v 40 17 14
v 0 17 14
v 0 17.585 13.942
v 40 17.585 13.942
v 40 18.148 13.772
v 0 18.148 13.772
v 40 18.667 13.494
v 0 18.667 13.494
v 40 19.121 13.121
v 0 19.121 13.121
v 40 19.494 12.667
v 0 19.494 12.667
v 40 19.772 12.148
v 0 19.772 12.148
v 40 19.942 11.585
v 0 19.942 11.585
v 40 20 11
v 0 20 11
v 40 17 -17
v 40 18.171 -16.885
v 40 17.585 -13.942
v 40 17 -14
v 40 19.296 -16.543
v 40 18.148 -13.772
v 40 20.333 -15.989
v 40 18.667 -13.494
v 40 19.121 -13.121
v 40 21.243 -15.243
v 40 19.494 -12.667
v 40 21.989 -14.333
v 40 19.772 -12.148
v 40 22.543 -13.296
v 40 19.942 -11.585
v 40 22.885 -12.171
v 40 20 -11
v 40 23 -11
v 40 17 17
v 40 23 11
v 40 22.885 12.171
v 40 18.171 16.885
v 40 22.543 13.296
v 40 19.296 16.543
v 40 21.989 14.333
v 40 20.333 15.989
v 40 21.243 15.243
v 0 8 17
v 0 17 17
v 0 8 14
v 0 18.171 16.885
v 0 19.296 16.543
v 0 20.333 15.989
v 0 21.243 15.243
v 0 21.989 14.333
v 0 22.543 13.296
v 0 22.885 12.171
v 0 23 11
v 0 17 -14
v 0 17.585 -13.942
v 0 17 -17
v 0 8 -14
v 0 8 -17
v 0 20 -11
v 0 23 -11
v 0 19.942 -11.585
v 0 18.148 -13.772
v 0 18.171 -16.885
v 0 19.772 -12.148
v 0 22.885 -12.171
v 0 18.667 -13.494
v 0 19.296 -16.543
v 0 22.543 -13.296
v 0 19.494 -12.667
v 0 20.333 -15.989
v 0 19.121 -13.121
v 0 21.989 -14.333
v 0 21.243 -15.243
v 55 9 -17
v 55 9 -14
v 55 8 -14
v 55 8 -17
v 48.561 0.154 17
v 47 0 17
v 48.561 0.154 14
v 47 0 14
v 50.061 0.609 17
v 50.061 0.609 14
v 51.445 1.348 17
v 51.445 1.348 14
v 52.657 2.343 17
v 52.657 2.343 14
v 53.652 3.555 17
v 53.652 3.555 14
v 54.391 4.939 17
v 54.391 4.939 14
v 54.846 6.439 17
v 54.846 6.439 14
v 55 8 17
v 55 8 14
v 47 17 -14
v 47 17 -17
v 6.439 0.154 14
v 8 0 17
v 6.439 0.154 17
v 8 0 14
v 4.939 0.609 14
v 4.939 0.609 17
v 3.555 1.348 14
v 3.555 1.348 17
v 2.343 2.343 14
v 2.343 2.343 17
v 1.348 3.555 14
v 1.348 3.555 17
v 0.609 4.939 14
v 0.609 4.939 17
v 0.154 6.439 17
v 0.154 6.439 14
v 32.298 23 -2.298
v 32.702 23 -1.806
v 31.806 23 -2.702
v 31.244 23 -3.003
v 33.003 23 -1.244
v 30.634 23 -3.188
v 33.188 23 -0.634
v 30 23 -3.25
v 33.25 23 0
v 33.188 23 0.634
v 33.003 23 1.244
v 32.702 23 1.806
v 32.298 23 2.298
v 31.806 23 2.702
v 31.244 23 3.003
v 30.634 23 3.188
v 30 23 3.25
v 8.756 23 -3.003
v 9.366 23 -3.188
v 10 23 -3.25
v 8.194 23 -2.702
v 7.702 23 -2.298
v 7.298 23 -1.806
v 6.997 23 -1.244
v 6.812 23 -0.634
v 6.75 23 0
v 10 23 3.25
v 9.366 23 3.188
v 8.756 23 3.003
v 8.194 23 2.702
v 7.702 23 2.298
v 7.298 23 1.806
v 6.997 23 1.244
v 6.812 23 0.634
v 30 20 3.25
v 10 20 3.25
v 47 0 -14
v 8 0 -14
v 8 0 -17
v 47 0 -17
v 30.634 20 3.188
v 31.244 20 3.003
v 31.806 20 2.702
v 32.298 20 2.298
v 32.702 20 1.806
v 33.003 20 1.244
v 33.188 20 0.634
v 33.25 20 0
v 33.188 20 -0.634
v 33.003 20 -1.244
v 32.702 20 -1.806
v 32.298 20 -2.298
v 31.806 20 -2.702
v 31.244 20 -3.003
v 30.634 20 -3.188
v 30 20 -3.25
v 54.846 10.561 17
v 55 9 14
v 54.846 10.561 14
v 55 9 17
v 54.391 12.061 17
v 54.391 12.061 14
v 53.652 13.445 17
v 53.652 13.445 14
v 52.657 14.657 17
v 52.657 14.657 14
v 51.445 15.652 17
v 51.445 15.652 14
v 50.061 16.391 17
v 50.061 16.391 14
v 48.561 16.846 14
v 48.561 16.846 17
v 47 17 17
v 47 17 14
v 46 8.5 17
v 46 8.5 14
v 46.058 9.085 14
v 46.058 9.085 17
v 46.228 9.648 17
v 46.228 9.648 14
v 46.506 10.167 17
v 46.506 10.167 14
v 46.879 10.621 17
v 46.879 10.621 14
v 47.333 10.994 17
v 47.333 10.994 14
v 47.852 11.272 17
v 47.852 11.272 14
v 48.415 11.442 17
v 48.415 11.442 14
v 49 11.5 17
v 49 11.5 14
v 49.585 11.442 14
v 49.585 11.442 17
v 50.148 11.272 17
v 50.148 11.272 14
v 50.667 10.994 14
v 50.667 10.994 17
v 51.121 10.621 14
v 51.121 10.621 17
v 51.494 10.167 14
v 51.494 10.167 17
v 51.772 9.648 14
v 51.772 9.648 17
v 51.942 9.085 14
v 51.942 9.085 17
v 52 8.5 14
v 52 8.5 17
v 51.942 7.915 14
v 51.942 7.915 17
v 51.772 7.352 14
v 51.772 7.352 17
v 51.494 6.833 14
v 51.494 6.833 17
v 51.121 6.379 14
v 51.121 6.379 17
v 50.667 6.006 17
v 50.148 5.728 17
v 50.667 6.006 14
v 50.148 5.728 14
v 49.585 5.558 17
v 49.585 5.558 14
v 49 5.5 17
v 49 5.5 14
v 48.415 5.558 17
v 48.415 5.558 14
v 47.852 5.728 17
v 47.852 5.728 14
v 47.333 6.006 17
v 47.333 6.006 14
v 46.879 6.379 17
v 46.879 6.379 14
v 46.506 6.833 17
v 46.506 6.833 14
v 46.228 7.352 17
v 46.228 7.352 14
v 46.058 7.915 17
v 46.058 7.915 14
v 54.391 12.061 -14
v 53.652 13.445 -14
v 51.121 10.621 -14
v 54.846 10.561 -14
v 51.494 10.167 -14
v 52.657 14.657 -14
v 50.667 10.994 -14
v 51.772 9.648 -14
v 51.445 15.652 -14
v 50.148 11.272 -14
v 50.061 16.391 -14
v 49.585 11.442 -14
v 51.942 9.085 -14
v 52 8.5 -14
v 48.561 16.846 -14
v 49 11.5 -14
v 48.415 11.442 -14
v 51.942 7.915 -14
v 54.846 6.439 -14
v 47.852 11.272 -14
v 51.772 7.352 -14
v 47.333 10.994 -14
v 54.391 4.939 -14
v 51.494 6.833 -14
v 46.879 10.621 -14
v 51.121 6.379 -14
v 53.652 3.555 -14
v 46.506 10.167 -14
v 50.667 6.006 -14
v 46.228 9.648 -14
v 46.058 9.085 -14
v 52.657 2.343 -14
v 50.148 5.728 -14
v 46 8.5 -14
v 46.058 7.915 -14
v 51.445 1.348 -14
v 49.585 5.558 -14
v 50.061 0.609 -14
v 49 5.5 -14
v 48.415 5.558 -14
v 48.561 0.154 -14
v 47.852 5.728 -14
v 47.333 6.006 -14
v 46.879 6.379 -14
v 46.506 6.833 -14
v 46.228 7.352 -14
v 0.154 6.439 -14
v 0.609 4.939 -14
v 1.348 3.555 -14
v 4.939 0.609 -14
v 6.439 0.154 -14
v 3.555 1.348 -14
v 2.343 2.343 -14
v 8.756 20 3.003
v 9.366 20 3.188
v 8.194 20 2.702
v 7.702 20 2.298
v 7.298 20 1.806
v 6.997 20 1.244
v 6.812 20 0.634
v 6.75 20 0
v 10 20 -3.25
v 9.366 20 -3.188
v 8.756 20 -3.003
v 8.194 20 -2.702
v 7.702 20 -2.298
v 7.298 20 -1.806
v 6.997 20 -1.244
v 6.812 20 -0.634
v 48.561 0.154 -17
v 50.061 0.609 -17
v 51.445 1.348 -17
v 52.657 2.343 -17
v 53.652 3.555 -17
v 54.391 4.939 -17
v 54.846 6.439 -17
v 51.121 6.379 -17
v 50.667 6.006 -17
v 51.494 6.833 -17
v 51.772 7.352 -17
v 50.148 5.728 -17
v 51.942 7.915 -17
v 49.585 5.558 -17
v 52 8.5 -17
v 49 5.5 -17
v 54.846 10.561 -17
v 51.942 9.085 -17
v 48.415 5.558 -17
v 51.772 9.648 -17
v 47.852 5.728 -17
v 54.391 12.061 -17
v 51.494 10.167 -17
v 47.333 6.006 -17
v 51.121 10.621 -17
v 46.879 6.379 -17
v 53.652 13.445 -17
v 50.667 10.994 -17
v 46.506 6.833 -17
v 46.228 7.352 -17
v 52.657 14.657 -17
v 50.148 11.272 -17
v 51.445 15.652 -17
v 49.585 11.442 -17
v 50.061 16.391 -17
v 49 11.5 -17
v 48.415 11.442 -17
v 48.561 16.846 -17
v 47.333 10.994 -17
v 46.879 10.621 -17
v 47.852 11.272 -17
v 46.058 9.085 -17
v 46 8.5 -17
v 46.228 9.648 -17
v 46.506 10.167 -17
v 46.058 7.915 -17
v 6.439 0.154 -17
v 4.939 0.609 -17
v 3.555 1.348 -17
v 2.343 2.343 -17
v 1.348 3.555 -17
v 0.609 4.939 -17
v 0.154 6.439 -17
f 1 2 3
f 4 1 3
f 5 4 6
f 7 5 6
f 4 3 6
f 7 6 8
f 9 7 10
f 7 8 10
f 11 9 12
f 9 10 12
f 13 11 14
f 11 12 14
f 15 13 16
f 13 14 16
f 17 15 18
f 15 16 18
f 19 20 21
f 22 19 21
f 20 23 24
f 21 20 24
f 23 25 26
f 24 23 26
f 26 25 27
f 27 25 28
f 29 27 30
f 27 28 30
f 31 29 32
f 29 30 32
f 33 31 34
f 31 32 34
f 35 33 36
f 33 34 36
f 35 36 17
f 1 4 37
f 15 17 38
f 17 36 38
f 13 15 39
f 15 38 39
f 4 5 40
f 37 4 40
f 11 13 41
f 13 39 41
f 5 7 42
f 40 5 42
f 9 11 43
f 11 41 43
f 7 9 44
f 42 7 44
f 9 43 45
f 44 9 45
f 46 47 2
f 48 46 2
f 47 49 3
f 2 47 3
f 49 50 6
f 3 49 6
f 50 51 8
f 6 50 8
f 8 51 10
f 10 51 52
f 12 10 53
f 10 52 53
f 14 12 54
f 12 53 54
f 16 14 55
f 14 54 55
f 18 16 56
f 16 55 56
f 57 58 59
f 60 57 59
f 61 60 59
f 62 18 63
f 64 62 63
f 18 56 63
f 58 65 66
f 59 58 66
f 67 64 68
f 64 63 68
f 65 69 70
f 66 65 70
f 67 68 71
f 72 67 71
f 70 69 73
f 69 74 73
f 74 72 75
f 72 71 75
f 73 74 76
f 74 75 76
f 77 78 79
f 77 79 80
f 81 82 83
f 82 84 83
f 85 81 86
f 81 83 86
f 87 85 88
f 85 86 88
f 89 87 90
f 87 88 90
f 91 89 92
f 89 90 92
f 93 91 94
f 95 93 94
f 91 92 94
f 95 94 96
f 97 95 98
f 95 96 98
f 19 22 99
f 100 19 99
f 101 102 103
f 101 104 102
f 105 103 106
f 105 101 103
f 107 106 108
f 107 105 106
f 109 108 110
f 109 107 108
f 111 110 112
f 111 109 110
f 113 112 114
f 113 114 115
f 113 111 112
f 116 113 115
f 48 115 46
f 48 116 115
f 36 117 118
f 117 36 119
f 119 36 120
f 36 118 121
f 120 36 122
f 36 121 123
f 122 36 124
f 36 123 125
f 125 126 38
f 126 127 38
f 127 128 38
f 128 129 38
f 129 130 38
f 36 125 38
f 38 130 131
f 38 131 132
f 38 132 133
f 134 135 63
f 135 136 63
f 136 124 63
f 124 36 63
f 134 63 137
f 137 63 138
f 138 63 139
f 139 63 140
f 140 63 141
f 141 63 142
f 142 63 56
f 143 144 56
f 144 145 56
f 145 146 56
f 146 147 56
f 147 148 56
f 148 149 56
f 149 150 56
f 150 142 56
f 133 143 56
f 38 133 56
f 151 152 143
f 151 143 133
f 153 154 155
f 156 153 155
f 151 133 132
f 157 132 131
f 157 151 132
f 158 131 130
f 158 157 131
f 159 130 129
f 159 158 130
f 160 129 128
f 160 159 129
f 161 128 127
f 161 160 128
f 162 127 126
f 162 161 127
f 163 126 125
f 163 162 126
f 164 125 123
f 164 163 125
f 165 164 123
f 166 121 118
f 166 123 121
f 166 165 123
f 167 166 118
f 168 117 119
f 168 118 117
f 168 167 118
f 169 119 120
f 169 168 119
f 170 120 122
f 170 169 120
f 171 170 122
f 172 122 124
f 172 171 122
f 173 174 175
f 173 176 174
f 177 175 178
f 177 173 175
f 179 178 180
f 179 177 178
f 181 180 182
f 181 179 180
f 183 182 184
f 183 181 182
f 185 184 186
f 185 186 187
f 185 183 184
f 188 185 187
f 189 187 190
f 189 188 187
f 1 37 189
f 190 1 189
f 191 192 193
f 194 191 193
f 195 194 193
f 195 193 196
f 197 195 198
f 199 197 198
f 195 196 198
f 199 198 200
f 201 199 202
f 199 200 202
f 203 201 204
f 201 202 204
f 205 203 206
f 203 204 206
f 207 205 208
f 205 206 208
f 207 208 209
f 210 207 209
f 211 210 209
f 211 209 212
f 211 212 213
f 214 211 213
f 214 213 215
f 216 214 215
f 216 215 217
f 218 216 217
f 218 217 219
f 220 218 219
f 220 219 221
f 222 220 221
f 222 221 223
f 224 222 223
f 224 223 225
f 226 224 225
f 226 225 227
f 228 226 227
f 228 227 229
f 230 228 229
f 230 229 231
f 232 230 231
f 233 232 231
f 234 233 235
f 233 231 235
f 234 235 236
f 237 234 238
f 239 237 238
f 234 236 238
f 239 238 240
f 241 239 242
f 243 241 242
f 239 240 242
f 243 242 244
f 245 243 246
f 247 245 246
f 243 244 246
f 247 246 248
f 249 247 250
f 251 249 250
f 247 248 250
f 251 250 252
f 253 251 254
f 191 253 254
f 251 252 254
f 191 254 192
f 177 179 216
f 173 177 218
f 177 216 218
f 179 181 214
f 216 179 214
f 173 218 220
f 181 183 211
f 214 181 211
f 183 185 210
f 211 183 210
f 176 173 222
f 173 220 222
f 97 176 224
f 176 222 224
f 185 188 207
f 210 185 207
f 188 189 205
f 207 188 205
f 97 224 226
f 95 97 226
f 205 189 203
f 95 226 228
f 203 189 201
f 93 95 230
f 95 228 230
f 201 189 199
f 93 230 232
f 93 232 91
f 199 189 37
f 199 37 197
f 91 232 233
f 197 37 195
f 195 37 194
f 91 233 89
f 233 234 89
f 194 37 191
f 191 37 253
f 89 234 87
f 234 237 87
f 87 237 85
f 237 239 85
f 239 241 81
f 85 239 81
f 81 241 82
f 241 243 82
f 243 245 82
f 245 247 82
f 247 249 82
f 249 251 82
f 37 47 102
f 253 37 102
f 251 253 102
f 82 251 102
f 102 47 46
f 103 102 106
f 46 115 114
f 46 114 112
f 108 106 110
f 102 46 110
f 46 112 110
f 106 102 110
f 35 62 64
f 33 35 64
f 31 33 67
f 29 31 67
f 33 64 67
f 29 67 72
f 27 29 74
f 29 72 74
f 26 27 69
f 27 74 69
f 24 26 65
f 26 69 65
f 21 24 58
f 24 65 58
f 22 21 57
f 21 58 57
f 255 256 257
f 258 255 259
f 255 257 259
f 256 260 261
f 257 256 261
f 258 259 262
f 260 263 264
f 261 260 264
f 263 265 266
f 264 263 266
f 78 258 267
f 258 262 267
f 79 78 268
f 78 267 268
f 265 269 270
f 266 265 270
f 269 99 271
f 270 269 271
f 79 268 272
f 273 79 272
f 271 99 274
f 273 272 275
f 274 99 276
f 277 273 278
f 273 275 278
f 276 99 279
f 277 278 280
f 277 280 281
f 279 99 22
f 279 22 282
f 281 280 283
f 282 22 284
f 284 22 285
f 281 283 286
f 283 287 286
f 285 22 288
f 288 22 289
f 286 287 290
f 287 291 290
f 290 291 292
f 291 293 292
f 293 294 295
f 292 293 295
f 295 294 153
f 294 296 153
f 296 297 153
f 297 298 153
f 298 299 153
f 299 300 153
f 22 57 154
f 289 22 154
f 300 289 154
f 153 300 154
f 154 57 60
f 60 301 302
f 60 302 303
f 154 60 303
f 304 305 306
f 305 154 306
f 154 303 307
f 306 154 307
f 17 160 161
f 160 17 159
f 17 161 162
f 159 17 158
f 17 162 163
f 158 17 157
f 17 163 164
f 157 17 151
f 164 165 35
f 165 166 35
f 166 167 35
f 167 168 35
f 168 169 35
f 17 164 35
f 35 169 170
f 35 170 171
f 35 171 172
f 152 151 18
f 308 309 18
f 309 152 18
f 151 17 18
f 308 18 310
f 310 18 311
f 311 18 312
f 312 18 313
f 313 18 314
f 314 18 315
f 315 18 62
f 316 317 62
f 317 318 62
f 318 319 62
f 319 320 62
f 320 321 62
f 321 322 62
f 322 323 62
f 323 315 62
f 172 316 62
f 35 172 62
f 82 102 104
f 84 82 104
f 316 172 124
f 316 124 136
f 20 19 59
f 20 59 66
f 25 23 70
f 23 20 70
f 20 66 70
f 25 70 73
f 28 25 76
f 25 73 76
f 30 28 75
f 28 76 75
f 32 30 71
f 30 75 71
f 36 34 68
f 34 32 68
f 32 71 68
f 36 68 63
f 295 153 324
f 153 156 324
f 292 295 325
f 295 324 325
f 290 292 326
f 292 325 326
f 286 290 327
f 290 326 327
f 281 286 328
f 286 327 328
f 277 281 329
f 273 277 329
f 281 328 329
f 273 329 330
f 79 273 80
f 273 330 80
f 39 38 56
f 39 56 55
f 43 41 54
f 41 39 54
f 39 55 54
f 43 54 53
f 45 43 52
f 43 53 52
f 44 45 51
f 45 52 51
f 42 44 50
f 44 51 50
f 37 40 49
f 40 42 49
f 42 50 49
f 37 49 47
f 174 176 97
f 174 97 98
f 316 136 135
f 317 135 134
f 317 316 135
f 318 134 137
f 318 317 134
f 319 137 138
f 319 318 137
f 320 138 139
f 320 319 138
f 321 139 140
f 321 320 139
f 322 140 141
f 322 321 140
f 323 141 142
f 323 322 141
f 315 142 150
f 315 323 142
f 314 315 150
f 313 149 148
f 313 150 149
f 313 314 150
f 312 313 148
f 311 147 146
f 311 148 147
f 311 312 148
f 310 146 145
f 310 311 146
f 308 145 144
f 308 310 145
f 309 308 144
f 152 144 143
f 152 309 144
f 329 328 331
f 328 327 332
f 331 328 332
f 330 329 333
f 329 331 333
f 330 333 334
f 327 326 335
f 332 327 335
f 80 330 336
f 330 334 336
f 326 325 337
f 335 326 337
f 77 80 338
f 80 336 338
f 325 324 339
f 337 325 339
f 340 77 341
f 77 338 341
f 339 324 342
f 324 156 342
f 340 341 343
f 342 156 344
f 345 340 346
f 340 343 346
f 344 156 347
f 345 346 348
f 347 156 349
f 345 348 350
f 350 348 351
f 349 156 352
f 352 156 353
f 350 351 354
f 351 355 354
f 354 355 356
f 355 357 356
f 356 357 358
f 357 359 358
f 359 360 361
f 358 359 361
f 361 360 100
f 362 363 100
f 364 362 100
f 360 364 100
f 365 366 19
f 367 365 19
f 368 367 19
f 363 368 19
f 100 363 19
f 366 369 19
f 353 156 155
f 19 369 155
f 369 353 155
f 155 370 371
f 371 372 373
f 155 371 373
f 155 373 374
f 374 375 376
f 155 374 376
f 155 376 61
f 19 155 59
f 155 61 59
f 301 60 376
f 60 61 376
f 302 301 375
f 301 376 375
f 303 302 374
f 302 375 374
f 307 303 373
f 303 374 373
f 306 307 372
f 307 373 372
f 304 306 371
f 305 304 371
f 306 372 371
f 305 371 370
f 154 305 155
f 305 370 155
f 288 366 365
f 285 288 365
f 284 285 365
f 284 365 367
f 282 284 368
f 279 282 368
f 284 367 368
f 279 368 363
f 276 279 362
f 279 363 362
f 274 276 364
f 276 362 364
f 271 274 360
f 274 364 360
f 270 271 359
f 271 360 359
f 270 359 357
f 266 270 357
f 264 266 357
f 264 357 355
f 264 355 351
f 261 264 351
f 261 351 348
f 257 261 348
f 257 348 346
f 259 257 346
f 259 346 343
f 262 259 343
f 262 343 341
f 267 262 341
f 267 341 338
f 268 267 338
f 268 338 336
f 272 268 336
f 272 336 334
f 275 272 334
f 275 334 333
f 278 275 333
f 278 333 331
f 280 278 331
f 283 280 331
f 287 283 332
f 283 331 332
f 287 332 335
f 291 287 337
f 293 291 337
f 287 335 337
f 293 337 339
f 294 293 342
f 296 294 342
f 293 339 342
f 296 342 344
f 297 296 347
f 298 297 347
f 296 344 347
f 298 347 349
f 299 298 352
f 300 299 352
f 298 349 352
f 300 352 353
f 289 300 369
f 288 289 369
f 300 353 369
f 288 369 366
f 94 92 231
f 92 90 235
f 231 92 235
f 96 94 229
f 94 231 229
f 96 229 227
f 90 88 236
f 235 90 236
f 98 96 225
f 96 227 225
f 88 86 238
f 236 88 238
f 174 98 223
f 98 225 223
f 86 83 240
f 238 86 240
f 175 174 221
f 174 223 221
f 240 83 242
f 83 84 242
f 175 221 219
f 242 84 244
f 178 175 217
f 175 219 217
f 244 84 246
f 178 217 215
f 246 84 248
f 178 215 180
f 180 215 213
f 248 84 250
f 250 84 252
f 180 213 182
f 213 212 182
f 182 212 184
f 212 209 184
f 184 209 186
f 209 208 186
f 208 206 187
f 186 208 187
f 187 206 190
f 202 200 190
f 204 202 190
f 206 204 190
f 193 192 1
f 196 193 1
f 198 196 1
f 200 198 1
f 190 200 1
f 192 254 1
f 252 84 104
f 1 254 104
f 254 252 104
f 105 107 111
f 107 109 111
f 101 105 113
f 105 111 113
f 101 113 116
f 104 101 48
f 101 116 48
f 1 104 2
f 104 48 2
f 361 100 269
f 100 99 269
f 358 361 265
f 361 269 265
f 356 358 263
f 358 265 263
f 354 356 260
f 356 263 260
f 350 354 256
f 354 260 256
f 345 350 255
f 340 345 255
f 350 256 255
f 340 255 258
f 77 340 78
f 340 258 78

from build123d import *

# Parameters (mm, degrees)
BASE_FLANGE1_DEPTH       = 55
EXTRUDE1_START           = -23
EXTRUDE1_OUTLINE_W       = 15
EXTRUDE1_OUTLINE_H       = 36
EXTRUDE1_DEPTH           = 6
F_6_0_6_DIAMETER_HOLE1_D = 6
FILLET1_R                = 8
EXTRUDE2_DEPTH           = 61.942595941
FILLET2_R                = 8


# Read off the part's stored shape, not the designer's step: Extrude1
# Sheet-metal steps are written as plain solids
with BuildPart() as part:
    # Sketch1 → Base-Flange1 (new body)
    with BuildSketch(Plane(origin=(0, 0, 0), x_dir=(0, 0, -1), z_dir=(1, 0, 0))):
        with BuildLine():
            Line((-14, 0), (-14, 17))
            ThreePointArc((-14, 17), (-13.121320344, 19.121320344), (-11, 20))
            Line((-11, 20), (11, 20))
            ThreePointArc((11, 20), (13.121320344, 19.121320344), (14, 17))
            Line((14, 17), (14, 0))
            Line((14, 0), (17, 0))
            Line((17, 0), (17, 17))
            ThreePointArc((17, 17), (15.242640687, 21.242640687), (11, 23))
            Line((11, 23), (-11, 23))
            ThreePointArc((-11, 23), (-15.242640687, 21.242640687), (-17, 17))
            Line((-17, 17), (-17, 0))
            Line((-17, 0), (-14, 0))
        make_face()
    extrude(amount=BASE_FLANGE1_DEPTH)

    # Extrude1 outline → Extrude1 (cut)
    with BuildSketch(Plane.XZ.offset(EXTRUDE1_START)):
        with Locations((47.5, 0)):
            Rectangle(EXTRUDE1_OUTLINE_W, EXTRUDE1_OUTLINE_H)
    extrude(amount=EXTRUDE1_DEPTH, mode=Mode.SUBTRACT)

    # Ø6.0 (6) Diameter Hole1 (through all)
    with Locations(Plane.XY.offset(17)):
        with Locations((49, 8.5)):
            Hole(F_6_0_6_DIAMETER_HOLE1_D / 2)

    # Fillet1
    fillet1_edges = [part.edges().sort_by_distance(p)[0] for p in [
        (55, 0, 15.5),
        (55, 17, -15.5),
        (55, 17, 15.5),
        (55, 0, -15.5),
    ]]
    fillet(fillet1_edges, radius=FILLET1_R)

    # Sketch11 → Extrude2 (cut, through all)
    with BuildSketch(Plane.XZ.offset(-20)):
        with BuildLine():
            Line((10, 3.25), (30, 3.25))
            ThreePointArc((30, 3.25), (33.25, 0), (30, -3.25))
            Line((30, -3.25), (10, -3.25))
            ThreePointArc((10, -3.25), (6.75, 0), (10, 3.25))
        make_face()
    extrude(amount=-EXTRUDE2_DEPTH, mode=Mode.SUBTRACT)

    # Fillet2
    fillet2_edges = [part.edges().sort_by_distance(p)[0] for p in [
        (0, 0, 15.5),
        (0, 0, -15.5),
    ]]
    fillet(fillet2_edges, radius=FILLET2_R)


solid = part.part
